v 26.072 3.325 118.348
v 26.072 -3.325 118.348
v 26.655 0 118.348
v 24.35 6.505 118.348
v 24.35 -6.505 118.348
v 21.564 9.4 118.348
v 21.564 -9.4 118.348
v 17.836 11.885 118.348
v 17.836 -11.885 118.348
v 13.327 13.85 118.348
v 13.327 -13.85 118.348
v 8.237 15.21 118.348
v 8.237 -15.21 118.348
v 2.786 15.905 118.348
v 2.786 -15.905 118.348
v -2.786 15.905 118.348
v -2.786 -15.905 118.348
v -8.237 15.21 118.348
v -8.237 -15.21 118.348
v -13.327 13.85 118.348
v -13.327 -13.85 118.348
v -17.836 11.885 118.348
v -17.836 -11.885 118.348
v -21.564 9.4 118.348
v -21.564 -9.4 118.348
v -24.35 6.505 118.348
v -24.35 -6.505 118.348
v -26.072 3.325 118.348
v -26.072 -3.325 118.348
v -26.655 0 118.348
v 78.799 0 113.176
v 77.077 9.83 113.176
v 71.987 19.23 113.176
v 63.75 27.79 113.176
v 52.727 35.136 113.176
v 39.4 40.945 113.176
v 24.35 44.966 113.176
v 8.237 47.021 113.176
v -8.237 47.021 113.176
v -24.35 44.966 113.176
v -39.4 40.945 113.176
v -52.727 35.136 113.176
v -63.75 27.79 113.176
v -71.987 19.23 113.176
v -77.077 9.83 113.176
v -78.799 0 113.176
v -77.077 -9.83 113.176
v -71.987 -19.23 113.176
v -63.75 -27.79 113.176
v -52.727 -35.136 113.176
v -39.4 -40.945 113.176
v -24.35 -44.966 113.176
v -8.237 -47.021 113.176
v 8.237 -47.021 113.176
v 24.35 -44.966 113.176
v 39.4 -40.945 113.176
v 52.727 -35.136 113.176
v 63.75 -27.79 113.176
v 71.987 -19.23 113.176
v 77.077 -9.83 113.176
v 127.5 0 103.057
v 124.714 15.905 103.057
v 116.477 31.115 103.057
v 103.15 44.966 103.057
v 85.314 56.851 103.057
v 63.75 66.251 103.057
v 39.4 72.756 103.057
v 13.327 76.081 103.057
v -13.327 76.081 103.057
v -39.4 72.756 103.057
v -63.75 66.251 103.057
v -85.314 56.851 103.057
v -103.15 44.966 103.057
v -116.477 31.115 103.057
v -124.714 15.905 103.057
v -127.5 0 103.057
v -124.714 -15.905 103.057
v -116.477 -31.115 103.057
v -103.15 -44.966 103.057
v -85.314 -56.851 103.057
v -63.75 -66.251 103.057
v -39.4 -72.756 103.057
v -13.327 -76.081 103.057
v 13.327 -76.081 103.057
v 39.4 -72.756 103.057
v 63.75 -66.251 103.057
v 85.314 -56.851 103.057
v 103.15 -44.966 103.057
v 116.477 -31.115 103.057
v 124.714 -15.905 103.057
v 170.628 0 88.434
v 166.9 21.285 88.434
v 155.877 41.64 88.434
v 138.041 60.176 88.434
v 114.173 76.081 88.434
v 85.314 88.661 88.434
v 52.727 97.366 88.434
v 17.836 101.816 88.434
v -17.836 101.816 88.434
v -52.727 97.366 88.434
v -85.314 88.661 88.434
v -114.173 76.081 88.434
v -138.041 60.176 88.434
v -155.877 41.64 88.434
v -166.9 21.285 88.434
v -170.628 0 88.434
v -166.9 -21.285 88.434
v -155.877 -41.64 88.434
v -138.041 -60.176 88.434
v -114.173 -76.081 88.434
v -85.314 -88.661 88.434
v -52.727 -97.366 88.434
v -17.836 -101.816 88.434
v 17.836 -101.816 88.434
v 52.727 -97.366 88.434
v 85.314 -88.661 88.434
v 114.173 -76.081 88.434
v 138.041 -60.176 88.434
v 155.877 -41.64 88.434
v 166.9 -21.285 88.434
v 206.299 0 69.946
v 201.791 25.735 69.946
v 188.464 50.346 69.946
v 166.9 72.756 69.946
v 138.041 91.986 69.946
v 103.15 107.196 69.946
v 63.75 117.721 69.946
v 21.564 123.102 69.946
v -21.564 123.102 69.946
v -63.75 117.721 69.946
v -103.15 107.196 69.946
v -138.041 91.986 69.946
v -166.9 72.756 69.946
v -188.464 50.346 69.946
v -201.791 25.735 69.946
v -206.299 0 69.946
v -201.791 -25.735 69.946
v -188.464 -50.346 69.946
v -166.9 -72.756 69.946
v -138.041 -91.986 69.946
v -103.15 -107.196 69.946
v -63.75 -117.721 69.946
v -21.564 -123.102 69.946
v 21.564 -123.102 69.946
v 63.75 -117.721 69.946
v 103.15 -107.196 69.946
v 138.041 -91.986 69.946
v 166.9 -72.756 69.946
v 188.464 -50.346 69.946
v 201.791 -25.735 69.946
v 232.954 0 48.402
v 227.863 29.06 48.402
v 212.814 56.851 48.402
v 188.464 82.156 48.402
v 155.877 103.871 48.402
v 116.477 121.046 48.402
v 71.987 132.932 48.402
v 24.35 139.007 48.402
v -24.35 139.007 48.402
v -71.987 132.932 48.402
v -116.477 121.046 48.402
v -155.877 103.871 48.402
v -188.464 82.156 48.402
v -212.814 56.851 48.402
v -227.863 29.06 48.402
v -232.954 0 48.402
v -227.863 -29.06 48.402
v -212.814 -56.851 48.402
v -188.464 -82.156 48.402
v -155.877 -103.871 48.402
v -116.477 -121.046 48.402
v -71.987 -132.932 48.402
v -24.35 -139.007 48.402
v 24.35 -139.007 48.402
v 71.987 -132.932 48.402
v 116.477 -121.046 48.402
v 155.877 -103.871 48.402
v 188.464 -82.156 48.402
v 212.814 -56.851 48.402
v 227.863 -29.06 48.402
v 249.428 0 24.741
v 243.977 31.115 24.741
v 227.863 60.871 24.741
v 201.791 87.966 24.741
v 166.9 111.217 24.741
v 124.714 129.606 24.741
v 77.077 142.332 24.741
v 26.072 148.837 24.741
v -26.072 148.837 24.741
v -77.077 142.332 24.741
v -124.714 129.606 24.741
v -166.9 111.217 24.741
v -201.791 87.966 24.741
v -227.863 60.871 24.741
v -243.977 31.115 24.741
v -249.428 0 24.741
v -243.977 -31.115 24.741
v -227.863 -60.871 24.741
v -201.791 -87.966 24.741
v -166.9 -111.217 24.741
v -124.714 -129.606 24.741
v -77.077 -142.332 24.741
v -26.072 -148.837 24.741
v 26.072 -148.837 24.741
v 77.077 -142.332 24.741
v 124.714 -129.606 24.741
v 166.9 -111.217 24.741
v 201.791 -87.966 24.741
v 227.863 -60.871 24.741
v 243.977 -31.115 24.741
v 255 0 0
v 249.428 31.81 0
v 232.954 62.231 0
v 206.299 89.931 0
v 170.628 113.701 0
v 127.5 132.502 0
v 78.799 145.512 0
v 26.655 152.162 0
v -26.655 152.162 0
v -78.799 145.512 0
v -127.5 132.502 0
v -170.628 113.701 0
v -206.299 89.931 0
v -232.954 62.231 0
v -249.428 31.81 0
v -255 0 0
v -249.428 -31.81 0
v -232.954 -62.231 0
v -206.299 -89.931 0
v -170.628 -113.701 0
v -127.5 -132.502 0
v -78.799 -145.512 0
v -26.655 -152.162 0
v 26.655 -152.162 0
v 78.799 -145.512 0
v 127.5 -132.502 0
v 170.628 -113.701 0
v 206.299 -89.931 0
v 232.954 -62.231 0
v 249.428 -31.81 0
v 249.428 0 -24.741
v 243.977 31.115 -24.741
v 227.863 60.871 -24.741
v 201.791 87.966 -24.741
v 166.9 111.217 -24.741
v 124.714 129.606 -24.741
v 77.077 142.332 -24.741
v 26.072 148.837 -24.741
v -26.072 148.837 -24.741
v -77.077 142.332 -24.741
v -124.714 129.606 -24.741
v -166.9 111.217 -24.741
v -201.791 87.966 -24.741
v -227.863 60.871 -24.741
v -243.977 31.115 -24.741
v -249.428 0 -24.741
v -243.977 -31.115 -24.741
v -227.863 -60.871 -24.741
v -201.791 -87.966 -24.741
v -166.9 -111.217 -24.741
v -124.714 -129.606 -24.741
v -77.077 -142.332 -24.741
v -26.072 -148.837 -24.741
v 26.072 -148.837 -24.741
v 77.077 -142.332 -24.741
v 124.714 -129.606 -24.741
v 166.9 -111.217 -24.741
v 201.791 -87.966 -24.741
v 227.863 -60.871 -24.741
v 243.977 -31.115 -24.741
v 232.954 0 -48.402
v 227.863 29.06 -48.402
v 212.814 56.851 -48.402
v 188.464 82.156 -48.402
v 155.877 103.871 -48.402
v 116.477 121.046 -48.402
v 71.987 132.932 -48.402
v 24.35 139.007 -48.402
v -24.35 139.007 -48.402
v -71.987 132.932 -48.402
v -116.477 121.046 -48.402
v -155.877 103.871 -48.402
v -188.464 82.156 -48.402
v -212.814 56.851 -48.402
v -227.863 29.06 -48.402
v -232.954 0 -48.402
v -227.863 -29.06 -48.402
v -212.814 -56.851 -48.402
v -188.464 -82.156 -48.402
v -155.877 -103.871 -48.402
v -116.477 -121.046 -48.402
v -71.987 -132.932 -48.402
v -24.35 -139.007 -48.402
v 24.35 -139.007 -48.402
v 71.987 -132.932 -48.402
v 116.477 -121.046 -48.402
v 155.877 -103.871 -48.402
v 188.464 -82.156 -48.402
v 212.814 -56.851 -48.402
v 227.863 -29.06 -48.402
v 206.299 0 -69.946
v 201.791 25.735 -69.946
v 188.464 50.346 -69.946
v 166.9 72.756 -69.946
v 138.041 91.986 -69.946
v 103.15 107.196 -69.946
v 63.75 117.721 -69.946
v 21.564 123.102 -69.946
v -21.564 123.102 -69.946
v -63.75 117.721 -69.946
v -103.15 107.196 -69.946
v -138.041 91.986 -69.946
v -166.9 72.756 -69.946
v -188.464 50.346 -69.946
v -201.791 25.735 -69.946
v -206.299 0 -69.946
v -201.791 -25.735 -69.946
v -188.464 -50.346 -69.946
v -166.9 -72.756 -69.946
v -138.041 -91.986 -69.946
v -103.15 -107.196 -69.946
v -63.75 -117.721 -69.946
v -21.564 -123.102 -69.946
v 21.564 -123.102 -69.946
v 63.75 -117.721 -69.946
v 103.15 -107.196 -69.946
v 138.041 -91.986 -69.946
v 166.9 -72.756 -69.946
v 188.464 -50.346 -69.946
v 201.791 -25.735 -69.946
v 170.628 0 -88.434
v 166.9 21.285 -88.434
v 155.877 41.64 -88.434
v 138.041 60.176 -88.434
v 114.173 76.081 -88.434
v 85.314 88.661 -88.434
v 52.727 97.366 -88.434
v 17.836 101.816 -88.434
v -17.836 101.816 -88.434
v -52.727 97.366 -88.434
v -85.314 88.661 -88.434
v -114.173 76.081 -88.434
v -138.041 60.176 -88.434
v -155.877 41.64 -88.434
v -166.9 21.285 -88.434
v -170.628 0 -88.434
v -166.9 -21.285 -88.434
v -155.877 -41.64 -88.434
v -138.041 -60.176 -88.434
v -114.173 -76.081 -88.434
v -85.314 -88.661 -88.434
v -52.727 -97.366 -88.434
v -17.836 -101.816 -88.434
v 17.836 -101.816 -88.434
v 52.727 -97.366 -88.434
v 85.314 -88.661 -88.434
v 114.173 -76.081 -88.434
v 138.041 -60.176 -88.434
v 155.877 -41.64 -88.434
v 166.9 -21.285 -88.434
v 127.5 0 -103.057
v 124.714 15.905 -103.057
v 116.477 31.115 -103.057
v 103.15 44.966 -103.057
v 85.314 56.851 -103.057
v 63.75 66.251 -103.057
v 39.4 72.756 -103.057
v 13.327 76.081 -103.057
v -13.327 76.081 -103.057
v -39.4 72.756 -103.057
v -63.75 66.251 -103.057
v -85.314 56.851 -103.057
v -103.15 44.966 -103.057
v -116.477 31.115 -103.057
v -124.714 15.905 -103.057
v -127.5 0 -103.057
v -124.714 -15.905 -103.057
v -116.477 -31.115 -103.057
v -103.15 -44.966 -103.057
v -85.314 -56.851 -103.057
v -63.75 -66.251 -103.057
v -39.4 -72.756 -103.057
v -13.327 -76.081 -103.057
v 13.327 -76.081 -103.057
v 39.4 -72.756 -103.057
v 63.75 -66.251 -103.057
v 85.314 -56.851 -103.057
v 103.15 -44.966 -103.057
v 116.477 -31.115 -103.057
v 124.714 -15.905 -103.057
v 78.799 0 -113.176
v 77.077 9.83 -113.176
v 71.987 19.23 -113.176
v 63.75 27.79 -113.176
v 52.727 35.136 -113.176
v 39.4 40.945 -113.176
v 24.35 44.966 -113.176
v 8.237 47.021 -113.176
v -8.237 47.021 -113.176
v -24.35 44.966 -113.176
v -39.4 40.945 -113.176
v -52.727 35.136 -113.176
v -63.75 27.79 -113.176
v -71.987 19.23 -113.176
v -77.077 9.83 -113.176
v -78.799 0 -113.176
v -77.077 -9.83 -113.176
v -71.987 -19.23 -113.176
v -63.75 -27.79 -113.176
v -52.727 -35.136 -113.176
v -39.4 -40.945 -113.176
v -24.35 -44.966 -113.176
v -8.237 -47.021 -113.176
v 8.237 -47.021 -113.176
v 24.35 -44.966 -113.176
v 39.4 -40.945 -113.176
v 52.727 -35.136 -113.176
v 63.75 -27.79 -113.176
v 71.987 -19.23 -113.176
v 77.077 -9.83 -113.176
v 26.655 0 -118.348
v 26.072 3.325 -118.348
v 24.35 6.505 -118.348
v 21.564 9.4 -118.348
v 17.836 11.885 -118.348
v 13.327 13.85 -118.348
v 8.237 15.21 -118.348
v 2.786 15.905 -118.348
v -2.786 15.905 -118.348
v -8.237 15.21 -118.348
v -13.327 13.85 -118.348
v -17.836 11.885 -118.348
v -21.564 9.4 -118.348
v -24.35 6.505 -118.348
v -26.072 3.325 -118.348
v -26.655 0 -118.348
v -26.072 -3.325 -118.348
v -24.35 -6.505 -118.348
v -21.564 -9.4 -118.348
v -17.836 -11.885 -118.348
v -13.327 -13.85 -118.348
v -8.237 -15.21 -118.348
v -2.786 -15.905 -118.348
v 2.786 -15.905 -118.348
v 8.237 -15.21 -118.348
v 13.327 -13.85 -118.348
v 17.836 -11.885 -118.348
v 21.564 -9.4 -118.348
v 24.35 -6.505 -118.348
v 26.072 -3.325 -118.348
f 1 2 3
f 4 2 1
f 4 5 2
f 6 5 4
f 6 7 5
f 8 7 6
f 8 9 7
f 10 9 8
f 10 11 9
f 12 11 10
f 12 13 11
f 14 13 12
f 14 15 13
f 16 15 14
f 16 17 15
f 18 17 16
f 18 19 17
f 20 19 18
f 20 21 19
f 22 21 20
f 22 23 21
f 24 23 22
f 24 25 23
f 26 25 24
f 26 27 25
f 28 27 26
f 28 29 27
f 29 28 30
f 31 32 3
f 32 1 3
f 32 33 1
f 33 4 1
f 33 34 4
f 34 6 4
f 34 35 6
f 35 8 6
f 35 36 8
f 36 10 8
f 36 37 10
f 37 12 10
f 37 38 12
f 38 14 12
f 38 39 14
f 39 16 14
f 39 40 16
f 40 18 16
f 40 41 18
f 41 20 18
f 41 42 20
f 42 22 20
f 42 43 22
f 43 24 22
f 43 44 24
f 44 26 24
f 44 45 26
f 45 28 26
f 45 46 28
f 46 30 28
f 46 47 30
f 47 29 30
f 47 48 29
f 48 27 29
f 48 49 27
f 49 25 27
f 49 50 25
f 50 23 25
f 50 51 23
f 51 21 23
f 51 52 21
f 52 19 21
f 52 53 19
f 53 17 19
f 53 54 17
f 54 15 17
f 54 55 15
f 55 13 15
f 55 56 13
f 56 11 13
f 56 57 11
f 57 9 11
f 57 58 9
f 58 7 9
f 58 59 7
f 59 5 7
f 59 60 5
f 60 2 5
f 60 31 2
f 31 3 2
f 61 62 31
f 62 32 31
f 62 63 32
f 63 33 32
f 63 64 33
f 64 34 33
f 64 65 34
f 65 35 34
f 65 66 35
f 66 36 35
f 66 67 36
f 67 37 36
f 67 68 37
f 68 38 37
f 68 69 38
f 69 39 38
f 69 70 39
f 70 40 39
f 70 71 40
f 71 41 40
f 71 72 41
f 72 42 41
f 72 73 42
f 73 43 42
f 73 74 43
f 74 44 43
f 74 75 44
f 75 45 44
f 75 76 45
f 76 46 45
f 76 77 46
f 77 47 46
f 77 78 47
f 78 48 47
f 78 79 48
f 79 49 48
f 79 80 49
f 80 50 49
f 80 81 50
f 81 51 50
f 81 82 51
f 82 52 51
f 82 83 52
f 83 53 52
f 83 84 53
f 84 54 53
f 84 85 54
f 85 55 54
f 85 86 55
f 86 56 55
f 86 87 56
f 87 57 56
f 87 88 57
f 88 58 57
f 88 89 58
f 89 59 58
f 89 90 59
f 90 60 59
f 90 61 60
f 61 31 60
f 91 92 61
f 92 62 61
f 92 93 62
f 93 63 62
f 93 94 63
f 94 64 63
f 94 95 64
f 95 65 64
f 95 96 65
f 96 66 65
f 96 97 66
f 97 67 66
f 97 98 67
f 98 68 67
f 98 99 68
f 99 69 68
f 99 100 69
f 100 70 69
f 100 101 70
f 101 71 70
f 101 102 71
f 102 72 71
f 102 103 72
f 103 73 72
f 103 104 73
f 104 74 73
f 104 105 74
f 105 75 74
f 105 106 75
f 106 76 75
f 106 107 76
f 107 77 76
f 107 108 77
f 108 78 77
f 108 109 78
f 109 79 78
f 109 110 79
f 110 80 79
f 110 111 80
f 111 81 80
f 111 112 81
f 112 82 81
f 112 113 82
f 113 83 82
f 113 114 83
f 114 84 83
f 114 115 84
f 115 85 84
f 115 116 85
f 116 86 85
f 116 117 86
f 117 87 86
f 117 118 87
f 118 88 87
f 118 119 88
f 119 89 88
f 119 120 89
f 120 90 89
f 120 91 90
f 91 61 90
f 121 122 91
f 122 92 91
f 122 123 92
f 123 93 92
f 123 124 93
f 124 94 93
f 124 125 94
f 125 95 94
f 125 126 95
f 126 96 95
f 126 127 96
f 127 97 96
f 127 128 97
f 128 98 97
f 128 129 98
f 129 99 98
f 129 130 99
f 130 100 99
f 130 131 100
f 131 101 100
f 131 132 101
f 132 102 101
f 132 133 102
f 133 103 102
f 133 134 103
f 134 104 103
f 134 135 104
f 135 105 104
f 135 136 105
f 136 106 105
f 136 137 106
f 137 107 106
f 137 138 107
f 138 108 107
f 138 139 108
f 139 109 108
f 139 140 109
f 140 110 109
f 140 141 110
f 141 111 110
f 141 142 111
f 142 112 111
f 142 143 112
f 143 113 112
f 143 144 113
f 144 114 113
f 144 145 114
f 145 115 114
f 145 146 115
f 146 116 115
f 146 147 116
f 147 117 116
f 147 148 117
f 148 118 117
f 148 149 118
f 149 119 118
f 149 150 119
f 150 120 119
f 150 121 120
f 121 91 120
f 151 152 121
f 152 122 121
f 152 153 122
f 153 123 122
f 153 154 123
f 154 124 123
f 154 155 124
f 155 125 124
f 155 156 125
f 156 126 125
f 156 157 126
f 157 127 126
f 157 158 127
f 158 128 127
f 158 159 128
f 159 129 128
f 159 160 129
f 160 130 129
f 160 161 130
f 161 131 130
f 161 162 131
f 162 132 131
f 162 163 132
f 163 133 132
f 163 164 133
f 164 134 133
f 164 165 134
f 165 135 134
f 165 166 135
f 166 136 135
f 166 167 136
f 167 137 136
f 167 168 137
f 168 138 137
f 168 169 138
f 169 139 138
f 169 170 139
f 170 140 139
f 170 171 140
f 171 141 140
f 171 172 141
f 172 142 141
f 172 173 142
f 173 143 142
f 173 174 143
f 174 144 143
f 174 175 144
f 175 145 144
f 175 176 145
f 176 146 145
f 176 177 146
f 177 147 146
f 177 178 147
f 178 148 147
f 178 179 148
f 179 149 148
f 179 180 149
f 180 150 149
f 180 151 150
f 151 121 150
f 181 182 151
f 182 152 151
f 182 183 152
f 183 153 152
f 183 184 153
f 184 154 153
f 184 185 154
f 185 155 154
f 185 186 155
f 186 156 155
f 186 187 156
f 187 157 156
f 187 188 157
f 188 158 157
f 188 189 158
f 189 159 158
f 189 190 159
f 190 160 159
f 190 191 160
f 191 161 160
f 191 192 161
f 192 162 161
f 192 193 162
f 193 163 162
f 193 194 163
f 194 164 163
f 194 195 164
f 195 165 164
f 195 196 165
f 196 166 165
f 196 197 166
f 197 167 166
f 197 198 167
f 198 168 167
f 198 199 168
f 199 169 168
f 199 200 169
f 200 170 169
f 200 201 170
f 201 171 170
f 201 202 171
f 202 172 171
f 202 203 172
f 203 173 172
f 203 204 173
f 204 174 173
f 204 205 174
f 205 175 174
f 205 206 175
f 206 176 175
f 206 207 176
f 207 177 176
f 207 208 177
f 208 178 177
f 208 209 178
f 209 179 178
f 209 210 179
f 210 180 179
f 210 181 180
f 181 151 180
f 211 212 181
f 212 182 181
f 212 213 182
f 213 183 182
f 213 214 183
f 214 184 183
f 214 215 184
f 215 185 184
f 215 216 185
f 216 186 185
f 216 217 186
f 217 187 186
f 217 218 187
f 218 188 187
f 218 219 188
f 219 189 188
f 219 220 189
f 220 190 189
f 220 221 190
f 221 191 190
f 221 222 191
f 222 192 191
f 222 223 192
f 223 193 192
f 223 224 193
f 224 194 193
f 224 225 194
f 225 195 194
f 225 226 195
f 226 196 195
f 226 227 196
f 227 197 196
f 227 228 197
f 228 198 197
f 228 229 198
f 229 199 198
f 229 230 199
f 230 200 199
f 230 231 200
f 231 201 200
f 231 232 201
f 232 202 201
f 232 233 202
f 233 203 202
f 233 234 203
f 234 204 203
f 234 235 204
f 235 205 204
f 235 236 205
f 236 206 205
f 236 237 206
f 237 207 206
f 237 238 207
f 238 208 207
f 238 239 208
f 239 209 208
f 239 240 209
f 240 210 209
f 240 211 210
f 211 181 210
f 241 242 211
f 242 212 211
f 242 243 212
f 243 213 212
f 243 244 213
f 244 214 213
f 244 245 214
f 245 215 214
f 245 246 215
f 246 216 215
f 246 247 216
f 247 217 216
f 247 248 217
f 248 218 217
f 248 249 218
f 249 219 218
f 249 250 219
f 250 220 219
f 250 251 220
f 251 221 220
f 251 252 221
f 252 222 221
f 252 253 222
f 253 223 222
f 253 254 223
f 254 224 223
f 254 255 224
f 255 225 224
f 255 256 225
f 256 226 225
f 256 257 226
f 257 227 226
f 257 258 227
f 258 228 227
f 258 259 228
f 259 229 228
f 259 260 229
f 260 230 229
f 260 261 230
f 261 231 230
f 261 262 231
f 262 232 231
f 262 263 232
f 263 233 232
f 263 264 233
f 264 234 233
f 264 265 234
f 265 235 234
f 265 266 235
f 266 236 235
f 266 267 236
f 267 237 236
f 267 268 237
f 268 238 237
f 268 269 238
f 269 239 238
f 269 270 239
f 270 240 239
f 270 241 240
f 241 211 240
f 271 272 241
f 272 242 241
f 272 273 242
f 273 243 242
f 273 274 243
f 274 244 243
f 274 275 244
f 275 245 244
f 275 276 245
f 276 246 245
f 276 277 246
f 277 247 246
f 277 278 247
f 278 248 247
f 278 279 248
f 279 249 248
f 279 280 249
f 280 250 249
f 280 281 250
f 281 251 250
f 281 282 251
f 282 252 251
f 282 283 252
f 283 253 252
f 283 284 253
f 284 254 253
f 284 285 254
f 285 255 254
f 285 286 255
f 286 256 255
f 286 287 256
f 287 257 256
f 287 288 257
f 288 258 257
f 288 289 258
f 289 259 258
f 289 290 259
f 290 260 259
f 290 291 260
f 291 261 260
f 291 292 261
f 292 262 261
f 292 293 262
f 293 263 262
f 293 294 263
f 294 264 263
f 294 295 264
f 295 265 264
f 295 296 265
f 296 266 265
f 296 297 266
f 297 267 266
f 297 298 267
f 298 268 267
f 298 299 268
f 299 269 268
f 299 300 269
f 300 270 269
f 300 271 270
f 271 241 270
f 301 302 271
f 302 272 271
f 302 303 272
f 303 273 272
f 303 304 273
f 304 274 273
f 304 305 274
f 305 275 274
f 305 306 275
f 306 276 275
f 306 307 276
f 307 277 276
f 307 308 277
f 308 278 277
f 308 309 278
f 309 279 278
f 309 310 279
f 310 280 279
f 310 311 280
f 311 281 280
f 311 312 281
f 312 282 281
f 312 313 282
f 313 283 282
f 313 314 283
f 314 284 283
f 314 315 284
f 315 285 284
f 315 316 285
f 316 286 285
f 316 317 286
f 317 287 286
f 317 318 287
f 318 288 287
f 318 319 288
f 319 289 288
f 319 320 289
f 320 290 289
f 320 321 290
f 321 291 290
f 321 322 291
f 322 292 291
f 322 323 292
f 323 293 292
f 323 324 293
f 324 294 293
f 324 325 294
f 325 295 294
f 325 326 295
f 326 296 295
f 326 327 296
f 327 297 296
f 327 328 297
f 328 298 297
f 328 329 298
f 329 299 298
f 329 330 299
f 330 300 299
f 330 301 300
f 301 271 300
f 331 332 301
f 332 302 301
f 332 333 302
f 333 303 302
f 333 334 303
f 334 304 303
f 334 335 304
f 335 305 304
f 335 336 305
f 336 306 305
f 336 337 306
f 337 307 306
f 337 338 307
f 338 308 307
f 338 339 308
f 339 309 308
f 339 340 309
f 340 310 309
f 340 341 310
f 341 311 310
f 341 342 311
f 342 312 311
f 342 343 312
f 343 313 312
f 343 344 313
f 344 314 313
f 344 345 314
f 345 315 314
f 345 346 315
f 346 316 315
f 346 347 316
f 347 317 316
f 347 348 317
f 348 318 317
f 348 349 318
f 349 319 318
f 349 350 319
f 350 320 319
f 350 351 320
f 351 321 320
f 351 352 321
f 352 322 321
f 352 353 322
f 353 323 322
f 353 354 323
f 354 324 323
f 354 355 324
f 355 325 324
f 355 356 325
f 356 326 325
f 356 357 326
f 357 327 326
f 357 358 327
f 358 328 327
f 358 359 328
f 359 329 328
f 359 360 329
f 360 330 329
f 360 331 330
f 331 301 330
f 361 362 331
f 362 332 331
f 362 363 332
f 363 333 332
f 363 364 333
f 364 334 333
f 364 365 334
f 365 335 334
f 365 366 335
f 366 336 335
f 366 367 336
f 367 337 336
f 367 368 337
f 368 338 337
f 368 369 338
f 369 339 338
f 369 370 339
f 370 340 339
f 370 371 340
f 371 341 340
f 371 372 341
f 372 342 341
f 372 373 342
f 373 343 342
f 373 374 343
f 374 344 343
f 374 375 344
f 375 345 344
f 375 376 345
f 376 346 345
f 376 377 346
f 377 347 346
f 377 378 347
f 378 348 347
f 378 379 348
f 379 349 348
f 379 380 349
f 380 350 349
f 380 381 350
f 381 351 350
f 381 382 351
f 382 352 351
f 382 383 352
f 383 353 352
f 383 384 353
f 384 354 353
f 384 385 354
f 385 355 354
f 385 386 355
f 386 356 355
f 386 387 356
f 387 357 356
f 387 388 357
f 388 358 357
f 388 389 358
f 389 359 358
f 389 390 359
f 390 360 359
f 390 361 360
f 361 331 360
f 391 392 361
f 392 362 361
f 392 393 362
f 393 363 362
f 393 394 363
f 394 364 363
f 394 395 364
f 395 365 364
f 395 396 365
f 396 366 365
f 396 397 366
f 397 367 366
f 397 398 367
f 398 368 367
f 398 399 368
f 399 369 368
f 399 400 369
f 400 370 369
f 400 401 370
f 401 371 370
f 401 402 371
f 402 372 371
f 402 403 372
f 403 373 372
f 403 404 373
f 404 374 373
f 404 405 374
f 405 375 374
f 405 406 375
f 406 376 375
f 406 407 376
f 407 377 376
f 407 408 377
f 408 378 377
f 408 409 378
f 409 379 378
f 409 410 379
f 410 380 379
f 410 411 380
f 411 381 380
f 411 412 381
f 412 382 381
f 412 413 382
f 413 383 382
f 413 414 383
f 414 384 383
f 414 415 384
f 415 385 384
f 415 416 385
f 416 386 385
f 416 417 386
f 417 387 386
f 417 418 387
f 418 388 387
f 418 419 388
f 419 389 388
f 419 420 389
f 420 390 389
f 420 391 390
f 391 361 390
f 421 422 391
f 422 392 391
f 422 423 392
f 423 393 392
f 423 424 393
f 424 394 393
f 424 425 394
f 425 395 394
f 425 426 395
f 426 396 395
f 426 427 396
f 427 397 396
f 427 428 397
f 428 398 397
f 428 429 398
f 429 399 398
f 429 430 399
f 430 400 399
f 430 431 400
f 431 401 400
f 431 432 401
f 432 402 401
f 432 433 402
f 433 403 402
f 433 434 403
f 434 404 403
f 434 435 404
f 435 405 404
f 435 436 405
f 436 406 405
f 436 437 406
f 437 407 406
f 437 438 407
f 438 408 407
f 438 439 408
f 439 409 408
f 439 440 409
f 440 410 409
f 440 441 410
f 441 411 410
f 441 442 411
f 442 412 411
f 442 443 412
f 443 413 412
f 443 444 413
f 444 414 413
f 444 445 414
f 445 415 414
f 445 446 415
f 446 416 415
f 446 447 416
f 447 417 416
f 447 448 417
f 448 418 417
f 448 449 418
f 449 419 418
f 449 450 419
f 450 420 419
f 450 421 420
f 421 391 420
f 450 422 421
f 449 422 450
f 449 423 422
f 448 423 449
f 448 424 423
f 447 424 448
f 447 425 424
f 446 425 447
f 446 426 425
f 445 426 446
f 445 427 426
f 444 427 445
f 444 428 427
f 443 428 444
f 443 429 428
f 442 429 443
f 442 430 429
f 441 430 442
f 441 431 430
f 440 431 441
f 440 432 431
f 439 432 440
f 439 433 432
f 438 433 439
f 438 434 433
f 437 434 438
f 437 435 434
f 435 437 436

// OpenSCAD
// Generated by SolidPython 1.0.1 on 2020-07-29 00:46:52


scale(v = [15, 9, 7]) {
	sphere(r = 17);
}
/***********************************************
*********      SolidPython code:      **********
************************************************
 
# import packages: SolidPython
from solid import *
from solid.utils import *
from itertools import chain, combinations, permutations


class Resize:

    def __init__(self, scad_file):
        self.scad_file = scad_file
        #self.scad_file = import_scad(scad_file)
        # cone/cylinder param:
        self.r1 = 0
        self.r2 = 0
        self.h = 0
        # rectangular prism param:
        self.w = 0
        self.l = 0
        # ellipse param:
        self.r = 0

    # import OpenScad code (file name corresponds to shape)


    # classify shape + parameters
    def assign(self, param1, param2, param3):
        if self.scad_file == 'cone.scad':
            self.r1 = param1
            self.r2 = param2
            self.h = param3
        elif self.scad_file == 'cylinder.scad':
            self.r1 = param1
            self.r2 = param2
            self.h = param3
        elif self.scad_file == 'rectangularPrism.scad':
            self.h = param1
            self.l = param2
            self.w = param3
        else:
            self.r = param1
            self.h = param2

    # resize parameters
    def iterate(self):
        x = range(3, 20, 2)
        i = 1
        if self.scad_file == 'cone.scad':
            tempList = list(permutations(x, 2))
            for temp in tempList:
                param1 = temp[0]
                param2 = temp[1]
                filepath = 'produced_scad_files/' + 'cone' + str(param1) + '_' + str(param2) + '_' + '.scad'
                scad_render_to_file(cylinder(h=param1, r1=param2, r2=0), filepath)

        elif self.scad_file == 'cylinder.scad':
            tempList = list(permutations(x, 3))
            for temp in tempList:
                param1 = temp[0]
                param2 = temp[1]
                filepath = 'produced_scad_files/' + 'cylinder' + str(param1) + '_' + str(param2) + '_' + '.scad'
                scad_render_to_file(cylinder(h=param1, r1=param2, r2=param2), filepath)

        elif self.scad_file == 'rectangularPrism.scad':
            tempList = list(permutations(x, 3))
            for temp in tempList:
                param1 = temp[0]
                param2 = temp[1]
                param3 = temp[2]
                filepath = 'produced_scad_files/' + 'rectangularPrism' + str(param1) + '_' + str(param2) + '_' + str(
                    param3) + '.scad'
                scad_render_to_file(cube(size=(param1, param2, param3)), filepath)

        elif self.scad_file == 'ellipse.scad':
            tempList = list(permutations(x, 4))
            for temp in tempList:
                param1 = temp[0]
                param2 = temp[1]
                param3 = temp[2]
                param4 = temp[3]
                filepath = 'produced_scad_files/' + 'ellipse' + str(param1) + '_' + str(param2) + '_' + str(param3) + '_' + str(param4) + '.scad'
                scad_render_to_file(scale([param1, param2, param3])(sphere(r=param4)), filepath)

    def render_to_scadfile(self):
        scad_render_to_file(scad, 'example.scad') 
 
************************************************/
